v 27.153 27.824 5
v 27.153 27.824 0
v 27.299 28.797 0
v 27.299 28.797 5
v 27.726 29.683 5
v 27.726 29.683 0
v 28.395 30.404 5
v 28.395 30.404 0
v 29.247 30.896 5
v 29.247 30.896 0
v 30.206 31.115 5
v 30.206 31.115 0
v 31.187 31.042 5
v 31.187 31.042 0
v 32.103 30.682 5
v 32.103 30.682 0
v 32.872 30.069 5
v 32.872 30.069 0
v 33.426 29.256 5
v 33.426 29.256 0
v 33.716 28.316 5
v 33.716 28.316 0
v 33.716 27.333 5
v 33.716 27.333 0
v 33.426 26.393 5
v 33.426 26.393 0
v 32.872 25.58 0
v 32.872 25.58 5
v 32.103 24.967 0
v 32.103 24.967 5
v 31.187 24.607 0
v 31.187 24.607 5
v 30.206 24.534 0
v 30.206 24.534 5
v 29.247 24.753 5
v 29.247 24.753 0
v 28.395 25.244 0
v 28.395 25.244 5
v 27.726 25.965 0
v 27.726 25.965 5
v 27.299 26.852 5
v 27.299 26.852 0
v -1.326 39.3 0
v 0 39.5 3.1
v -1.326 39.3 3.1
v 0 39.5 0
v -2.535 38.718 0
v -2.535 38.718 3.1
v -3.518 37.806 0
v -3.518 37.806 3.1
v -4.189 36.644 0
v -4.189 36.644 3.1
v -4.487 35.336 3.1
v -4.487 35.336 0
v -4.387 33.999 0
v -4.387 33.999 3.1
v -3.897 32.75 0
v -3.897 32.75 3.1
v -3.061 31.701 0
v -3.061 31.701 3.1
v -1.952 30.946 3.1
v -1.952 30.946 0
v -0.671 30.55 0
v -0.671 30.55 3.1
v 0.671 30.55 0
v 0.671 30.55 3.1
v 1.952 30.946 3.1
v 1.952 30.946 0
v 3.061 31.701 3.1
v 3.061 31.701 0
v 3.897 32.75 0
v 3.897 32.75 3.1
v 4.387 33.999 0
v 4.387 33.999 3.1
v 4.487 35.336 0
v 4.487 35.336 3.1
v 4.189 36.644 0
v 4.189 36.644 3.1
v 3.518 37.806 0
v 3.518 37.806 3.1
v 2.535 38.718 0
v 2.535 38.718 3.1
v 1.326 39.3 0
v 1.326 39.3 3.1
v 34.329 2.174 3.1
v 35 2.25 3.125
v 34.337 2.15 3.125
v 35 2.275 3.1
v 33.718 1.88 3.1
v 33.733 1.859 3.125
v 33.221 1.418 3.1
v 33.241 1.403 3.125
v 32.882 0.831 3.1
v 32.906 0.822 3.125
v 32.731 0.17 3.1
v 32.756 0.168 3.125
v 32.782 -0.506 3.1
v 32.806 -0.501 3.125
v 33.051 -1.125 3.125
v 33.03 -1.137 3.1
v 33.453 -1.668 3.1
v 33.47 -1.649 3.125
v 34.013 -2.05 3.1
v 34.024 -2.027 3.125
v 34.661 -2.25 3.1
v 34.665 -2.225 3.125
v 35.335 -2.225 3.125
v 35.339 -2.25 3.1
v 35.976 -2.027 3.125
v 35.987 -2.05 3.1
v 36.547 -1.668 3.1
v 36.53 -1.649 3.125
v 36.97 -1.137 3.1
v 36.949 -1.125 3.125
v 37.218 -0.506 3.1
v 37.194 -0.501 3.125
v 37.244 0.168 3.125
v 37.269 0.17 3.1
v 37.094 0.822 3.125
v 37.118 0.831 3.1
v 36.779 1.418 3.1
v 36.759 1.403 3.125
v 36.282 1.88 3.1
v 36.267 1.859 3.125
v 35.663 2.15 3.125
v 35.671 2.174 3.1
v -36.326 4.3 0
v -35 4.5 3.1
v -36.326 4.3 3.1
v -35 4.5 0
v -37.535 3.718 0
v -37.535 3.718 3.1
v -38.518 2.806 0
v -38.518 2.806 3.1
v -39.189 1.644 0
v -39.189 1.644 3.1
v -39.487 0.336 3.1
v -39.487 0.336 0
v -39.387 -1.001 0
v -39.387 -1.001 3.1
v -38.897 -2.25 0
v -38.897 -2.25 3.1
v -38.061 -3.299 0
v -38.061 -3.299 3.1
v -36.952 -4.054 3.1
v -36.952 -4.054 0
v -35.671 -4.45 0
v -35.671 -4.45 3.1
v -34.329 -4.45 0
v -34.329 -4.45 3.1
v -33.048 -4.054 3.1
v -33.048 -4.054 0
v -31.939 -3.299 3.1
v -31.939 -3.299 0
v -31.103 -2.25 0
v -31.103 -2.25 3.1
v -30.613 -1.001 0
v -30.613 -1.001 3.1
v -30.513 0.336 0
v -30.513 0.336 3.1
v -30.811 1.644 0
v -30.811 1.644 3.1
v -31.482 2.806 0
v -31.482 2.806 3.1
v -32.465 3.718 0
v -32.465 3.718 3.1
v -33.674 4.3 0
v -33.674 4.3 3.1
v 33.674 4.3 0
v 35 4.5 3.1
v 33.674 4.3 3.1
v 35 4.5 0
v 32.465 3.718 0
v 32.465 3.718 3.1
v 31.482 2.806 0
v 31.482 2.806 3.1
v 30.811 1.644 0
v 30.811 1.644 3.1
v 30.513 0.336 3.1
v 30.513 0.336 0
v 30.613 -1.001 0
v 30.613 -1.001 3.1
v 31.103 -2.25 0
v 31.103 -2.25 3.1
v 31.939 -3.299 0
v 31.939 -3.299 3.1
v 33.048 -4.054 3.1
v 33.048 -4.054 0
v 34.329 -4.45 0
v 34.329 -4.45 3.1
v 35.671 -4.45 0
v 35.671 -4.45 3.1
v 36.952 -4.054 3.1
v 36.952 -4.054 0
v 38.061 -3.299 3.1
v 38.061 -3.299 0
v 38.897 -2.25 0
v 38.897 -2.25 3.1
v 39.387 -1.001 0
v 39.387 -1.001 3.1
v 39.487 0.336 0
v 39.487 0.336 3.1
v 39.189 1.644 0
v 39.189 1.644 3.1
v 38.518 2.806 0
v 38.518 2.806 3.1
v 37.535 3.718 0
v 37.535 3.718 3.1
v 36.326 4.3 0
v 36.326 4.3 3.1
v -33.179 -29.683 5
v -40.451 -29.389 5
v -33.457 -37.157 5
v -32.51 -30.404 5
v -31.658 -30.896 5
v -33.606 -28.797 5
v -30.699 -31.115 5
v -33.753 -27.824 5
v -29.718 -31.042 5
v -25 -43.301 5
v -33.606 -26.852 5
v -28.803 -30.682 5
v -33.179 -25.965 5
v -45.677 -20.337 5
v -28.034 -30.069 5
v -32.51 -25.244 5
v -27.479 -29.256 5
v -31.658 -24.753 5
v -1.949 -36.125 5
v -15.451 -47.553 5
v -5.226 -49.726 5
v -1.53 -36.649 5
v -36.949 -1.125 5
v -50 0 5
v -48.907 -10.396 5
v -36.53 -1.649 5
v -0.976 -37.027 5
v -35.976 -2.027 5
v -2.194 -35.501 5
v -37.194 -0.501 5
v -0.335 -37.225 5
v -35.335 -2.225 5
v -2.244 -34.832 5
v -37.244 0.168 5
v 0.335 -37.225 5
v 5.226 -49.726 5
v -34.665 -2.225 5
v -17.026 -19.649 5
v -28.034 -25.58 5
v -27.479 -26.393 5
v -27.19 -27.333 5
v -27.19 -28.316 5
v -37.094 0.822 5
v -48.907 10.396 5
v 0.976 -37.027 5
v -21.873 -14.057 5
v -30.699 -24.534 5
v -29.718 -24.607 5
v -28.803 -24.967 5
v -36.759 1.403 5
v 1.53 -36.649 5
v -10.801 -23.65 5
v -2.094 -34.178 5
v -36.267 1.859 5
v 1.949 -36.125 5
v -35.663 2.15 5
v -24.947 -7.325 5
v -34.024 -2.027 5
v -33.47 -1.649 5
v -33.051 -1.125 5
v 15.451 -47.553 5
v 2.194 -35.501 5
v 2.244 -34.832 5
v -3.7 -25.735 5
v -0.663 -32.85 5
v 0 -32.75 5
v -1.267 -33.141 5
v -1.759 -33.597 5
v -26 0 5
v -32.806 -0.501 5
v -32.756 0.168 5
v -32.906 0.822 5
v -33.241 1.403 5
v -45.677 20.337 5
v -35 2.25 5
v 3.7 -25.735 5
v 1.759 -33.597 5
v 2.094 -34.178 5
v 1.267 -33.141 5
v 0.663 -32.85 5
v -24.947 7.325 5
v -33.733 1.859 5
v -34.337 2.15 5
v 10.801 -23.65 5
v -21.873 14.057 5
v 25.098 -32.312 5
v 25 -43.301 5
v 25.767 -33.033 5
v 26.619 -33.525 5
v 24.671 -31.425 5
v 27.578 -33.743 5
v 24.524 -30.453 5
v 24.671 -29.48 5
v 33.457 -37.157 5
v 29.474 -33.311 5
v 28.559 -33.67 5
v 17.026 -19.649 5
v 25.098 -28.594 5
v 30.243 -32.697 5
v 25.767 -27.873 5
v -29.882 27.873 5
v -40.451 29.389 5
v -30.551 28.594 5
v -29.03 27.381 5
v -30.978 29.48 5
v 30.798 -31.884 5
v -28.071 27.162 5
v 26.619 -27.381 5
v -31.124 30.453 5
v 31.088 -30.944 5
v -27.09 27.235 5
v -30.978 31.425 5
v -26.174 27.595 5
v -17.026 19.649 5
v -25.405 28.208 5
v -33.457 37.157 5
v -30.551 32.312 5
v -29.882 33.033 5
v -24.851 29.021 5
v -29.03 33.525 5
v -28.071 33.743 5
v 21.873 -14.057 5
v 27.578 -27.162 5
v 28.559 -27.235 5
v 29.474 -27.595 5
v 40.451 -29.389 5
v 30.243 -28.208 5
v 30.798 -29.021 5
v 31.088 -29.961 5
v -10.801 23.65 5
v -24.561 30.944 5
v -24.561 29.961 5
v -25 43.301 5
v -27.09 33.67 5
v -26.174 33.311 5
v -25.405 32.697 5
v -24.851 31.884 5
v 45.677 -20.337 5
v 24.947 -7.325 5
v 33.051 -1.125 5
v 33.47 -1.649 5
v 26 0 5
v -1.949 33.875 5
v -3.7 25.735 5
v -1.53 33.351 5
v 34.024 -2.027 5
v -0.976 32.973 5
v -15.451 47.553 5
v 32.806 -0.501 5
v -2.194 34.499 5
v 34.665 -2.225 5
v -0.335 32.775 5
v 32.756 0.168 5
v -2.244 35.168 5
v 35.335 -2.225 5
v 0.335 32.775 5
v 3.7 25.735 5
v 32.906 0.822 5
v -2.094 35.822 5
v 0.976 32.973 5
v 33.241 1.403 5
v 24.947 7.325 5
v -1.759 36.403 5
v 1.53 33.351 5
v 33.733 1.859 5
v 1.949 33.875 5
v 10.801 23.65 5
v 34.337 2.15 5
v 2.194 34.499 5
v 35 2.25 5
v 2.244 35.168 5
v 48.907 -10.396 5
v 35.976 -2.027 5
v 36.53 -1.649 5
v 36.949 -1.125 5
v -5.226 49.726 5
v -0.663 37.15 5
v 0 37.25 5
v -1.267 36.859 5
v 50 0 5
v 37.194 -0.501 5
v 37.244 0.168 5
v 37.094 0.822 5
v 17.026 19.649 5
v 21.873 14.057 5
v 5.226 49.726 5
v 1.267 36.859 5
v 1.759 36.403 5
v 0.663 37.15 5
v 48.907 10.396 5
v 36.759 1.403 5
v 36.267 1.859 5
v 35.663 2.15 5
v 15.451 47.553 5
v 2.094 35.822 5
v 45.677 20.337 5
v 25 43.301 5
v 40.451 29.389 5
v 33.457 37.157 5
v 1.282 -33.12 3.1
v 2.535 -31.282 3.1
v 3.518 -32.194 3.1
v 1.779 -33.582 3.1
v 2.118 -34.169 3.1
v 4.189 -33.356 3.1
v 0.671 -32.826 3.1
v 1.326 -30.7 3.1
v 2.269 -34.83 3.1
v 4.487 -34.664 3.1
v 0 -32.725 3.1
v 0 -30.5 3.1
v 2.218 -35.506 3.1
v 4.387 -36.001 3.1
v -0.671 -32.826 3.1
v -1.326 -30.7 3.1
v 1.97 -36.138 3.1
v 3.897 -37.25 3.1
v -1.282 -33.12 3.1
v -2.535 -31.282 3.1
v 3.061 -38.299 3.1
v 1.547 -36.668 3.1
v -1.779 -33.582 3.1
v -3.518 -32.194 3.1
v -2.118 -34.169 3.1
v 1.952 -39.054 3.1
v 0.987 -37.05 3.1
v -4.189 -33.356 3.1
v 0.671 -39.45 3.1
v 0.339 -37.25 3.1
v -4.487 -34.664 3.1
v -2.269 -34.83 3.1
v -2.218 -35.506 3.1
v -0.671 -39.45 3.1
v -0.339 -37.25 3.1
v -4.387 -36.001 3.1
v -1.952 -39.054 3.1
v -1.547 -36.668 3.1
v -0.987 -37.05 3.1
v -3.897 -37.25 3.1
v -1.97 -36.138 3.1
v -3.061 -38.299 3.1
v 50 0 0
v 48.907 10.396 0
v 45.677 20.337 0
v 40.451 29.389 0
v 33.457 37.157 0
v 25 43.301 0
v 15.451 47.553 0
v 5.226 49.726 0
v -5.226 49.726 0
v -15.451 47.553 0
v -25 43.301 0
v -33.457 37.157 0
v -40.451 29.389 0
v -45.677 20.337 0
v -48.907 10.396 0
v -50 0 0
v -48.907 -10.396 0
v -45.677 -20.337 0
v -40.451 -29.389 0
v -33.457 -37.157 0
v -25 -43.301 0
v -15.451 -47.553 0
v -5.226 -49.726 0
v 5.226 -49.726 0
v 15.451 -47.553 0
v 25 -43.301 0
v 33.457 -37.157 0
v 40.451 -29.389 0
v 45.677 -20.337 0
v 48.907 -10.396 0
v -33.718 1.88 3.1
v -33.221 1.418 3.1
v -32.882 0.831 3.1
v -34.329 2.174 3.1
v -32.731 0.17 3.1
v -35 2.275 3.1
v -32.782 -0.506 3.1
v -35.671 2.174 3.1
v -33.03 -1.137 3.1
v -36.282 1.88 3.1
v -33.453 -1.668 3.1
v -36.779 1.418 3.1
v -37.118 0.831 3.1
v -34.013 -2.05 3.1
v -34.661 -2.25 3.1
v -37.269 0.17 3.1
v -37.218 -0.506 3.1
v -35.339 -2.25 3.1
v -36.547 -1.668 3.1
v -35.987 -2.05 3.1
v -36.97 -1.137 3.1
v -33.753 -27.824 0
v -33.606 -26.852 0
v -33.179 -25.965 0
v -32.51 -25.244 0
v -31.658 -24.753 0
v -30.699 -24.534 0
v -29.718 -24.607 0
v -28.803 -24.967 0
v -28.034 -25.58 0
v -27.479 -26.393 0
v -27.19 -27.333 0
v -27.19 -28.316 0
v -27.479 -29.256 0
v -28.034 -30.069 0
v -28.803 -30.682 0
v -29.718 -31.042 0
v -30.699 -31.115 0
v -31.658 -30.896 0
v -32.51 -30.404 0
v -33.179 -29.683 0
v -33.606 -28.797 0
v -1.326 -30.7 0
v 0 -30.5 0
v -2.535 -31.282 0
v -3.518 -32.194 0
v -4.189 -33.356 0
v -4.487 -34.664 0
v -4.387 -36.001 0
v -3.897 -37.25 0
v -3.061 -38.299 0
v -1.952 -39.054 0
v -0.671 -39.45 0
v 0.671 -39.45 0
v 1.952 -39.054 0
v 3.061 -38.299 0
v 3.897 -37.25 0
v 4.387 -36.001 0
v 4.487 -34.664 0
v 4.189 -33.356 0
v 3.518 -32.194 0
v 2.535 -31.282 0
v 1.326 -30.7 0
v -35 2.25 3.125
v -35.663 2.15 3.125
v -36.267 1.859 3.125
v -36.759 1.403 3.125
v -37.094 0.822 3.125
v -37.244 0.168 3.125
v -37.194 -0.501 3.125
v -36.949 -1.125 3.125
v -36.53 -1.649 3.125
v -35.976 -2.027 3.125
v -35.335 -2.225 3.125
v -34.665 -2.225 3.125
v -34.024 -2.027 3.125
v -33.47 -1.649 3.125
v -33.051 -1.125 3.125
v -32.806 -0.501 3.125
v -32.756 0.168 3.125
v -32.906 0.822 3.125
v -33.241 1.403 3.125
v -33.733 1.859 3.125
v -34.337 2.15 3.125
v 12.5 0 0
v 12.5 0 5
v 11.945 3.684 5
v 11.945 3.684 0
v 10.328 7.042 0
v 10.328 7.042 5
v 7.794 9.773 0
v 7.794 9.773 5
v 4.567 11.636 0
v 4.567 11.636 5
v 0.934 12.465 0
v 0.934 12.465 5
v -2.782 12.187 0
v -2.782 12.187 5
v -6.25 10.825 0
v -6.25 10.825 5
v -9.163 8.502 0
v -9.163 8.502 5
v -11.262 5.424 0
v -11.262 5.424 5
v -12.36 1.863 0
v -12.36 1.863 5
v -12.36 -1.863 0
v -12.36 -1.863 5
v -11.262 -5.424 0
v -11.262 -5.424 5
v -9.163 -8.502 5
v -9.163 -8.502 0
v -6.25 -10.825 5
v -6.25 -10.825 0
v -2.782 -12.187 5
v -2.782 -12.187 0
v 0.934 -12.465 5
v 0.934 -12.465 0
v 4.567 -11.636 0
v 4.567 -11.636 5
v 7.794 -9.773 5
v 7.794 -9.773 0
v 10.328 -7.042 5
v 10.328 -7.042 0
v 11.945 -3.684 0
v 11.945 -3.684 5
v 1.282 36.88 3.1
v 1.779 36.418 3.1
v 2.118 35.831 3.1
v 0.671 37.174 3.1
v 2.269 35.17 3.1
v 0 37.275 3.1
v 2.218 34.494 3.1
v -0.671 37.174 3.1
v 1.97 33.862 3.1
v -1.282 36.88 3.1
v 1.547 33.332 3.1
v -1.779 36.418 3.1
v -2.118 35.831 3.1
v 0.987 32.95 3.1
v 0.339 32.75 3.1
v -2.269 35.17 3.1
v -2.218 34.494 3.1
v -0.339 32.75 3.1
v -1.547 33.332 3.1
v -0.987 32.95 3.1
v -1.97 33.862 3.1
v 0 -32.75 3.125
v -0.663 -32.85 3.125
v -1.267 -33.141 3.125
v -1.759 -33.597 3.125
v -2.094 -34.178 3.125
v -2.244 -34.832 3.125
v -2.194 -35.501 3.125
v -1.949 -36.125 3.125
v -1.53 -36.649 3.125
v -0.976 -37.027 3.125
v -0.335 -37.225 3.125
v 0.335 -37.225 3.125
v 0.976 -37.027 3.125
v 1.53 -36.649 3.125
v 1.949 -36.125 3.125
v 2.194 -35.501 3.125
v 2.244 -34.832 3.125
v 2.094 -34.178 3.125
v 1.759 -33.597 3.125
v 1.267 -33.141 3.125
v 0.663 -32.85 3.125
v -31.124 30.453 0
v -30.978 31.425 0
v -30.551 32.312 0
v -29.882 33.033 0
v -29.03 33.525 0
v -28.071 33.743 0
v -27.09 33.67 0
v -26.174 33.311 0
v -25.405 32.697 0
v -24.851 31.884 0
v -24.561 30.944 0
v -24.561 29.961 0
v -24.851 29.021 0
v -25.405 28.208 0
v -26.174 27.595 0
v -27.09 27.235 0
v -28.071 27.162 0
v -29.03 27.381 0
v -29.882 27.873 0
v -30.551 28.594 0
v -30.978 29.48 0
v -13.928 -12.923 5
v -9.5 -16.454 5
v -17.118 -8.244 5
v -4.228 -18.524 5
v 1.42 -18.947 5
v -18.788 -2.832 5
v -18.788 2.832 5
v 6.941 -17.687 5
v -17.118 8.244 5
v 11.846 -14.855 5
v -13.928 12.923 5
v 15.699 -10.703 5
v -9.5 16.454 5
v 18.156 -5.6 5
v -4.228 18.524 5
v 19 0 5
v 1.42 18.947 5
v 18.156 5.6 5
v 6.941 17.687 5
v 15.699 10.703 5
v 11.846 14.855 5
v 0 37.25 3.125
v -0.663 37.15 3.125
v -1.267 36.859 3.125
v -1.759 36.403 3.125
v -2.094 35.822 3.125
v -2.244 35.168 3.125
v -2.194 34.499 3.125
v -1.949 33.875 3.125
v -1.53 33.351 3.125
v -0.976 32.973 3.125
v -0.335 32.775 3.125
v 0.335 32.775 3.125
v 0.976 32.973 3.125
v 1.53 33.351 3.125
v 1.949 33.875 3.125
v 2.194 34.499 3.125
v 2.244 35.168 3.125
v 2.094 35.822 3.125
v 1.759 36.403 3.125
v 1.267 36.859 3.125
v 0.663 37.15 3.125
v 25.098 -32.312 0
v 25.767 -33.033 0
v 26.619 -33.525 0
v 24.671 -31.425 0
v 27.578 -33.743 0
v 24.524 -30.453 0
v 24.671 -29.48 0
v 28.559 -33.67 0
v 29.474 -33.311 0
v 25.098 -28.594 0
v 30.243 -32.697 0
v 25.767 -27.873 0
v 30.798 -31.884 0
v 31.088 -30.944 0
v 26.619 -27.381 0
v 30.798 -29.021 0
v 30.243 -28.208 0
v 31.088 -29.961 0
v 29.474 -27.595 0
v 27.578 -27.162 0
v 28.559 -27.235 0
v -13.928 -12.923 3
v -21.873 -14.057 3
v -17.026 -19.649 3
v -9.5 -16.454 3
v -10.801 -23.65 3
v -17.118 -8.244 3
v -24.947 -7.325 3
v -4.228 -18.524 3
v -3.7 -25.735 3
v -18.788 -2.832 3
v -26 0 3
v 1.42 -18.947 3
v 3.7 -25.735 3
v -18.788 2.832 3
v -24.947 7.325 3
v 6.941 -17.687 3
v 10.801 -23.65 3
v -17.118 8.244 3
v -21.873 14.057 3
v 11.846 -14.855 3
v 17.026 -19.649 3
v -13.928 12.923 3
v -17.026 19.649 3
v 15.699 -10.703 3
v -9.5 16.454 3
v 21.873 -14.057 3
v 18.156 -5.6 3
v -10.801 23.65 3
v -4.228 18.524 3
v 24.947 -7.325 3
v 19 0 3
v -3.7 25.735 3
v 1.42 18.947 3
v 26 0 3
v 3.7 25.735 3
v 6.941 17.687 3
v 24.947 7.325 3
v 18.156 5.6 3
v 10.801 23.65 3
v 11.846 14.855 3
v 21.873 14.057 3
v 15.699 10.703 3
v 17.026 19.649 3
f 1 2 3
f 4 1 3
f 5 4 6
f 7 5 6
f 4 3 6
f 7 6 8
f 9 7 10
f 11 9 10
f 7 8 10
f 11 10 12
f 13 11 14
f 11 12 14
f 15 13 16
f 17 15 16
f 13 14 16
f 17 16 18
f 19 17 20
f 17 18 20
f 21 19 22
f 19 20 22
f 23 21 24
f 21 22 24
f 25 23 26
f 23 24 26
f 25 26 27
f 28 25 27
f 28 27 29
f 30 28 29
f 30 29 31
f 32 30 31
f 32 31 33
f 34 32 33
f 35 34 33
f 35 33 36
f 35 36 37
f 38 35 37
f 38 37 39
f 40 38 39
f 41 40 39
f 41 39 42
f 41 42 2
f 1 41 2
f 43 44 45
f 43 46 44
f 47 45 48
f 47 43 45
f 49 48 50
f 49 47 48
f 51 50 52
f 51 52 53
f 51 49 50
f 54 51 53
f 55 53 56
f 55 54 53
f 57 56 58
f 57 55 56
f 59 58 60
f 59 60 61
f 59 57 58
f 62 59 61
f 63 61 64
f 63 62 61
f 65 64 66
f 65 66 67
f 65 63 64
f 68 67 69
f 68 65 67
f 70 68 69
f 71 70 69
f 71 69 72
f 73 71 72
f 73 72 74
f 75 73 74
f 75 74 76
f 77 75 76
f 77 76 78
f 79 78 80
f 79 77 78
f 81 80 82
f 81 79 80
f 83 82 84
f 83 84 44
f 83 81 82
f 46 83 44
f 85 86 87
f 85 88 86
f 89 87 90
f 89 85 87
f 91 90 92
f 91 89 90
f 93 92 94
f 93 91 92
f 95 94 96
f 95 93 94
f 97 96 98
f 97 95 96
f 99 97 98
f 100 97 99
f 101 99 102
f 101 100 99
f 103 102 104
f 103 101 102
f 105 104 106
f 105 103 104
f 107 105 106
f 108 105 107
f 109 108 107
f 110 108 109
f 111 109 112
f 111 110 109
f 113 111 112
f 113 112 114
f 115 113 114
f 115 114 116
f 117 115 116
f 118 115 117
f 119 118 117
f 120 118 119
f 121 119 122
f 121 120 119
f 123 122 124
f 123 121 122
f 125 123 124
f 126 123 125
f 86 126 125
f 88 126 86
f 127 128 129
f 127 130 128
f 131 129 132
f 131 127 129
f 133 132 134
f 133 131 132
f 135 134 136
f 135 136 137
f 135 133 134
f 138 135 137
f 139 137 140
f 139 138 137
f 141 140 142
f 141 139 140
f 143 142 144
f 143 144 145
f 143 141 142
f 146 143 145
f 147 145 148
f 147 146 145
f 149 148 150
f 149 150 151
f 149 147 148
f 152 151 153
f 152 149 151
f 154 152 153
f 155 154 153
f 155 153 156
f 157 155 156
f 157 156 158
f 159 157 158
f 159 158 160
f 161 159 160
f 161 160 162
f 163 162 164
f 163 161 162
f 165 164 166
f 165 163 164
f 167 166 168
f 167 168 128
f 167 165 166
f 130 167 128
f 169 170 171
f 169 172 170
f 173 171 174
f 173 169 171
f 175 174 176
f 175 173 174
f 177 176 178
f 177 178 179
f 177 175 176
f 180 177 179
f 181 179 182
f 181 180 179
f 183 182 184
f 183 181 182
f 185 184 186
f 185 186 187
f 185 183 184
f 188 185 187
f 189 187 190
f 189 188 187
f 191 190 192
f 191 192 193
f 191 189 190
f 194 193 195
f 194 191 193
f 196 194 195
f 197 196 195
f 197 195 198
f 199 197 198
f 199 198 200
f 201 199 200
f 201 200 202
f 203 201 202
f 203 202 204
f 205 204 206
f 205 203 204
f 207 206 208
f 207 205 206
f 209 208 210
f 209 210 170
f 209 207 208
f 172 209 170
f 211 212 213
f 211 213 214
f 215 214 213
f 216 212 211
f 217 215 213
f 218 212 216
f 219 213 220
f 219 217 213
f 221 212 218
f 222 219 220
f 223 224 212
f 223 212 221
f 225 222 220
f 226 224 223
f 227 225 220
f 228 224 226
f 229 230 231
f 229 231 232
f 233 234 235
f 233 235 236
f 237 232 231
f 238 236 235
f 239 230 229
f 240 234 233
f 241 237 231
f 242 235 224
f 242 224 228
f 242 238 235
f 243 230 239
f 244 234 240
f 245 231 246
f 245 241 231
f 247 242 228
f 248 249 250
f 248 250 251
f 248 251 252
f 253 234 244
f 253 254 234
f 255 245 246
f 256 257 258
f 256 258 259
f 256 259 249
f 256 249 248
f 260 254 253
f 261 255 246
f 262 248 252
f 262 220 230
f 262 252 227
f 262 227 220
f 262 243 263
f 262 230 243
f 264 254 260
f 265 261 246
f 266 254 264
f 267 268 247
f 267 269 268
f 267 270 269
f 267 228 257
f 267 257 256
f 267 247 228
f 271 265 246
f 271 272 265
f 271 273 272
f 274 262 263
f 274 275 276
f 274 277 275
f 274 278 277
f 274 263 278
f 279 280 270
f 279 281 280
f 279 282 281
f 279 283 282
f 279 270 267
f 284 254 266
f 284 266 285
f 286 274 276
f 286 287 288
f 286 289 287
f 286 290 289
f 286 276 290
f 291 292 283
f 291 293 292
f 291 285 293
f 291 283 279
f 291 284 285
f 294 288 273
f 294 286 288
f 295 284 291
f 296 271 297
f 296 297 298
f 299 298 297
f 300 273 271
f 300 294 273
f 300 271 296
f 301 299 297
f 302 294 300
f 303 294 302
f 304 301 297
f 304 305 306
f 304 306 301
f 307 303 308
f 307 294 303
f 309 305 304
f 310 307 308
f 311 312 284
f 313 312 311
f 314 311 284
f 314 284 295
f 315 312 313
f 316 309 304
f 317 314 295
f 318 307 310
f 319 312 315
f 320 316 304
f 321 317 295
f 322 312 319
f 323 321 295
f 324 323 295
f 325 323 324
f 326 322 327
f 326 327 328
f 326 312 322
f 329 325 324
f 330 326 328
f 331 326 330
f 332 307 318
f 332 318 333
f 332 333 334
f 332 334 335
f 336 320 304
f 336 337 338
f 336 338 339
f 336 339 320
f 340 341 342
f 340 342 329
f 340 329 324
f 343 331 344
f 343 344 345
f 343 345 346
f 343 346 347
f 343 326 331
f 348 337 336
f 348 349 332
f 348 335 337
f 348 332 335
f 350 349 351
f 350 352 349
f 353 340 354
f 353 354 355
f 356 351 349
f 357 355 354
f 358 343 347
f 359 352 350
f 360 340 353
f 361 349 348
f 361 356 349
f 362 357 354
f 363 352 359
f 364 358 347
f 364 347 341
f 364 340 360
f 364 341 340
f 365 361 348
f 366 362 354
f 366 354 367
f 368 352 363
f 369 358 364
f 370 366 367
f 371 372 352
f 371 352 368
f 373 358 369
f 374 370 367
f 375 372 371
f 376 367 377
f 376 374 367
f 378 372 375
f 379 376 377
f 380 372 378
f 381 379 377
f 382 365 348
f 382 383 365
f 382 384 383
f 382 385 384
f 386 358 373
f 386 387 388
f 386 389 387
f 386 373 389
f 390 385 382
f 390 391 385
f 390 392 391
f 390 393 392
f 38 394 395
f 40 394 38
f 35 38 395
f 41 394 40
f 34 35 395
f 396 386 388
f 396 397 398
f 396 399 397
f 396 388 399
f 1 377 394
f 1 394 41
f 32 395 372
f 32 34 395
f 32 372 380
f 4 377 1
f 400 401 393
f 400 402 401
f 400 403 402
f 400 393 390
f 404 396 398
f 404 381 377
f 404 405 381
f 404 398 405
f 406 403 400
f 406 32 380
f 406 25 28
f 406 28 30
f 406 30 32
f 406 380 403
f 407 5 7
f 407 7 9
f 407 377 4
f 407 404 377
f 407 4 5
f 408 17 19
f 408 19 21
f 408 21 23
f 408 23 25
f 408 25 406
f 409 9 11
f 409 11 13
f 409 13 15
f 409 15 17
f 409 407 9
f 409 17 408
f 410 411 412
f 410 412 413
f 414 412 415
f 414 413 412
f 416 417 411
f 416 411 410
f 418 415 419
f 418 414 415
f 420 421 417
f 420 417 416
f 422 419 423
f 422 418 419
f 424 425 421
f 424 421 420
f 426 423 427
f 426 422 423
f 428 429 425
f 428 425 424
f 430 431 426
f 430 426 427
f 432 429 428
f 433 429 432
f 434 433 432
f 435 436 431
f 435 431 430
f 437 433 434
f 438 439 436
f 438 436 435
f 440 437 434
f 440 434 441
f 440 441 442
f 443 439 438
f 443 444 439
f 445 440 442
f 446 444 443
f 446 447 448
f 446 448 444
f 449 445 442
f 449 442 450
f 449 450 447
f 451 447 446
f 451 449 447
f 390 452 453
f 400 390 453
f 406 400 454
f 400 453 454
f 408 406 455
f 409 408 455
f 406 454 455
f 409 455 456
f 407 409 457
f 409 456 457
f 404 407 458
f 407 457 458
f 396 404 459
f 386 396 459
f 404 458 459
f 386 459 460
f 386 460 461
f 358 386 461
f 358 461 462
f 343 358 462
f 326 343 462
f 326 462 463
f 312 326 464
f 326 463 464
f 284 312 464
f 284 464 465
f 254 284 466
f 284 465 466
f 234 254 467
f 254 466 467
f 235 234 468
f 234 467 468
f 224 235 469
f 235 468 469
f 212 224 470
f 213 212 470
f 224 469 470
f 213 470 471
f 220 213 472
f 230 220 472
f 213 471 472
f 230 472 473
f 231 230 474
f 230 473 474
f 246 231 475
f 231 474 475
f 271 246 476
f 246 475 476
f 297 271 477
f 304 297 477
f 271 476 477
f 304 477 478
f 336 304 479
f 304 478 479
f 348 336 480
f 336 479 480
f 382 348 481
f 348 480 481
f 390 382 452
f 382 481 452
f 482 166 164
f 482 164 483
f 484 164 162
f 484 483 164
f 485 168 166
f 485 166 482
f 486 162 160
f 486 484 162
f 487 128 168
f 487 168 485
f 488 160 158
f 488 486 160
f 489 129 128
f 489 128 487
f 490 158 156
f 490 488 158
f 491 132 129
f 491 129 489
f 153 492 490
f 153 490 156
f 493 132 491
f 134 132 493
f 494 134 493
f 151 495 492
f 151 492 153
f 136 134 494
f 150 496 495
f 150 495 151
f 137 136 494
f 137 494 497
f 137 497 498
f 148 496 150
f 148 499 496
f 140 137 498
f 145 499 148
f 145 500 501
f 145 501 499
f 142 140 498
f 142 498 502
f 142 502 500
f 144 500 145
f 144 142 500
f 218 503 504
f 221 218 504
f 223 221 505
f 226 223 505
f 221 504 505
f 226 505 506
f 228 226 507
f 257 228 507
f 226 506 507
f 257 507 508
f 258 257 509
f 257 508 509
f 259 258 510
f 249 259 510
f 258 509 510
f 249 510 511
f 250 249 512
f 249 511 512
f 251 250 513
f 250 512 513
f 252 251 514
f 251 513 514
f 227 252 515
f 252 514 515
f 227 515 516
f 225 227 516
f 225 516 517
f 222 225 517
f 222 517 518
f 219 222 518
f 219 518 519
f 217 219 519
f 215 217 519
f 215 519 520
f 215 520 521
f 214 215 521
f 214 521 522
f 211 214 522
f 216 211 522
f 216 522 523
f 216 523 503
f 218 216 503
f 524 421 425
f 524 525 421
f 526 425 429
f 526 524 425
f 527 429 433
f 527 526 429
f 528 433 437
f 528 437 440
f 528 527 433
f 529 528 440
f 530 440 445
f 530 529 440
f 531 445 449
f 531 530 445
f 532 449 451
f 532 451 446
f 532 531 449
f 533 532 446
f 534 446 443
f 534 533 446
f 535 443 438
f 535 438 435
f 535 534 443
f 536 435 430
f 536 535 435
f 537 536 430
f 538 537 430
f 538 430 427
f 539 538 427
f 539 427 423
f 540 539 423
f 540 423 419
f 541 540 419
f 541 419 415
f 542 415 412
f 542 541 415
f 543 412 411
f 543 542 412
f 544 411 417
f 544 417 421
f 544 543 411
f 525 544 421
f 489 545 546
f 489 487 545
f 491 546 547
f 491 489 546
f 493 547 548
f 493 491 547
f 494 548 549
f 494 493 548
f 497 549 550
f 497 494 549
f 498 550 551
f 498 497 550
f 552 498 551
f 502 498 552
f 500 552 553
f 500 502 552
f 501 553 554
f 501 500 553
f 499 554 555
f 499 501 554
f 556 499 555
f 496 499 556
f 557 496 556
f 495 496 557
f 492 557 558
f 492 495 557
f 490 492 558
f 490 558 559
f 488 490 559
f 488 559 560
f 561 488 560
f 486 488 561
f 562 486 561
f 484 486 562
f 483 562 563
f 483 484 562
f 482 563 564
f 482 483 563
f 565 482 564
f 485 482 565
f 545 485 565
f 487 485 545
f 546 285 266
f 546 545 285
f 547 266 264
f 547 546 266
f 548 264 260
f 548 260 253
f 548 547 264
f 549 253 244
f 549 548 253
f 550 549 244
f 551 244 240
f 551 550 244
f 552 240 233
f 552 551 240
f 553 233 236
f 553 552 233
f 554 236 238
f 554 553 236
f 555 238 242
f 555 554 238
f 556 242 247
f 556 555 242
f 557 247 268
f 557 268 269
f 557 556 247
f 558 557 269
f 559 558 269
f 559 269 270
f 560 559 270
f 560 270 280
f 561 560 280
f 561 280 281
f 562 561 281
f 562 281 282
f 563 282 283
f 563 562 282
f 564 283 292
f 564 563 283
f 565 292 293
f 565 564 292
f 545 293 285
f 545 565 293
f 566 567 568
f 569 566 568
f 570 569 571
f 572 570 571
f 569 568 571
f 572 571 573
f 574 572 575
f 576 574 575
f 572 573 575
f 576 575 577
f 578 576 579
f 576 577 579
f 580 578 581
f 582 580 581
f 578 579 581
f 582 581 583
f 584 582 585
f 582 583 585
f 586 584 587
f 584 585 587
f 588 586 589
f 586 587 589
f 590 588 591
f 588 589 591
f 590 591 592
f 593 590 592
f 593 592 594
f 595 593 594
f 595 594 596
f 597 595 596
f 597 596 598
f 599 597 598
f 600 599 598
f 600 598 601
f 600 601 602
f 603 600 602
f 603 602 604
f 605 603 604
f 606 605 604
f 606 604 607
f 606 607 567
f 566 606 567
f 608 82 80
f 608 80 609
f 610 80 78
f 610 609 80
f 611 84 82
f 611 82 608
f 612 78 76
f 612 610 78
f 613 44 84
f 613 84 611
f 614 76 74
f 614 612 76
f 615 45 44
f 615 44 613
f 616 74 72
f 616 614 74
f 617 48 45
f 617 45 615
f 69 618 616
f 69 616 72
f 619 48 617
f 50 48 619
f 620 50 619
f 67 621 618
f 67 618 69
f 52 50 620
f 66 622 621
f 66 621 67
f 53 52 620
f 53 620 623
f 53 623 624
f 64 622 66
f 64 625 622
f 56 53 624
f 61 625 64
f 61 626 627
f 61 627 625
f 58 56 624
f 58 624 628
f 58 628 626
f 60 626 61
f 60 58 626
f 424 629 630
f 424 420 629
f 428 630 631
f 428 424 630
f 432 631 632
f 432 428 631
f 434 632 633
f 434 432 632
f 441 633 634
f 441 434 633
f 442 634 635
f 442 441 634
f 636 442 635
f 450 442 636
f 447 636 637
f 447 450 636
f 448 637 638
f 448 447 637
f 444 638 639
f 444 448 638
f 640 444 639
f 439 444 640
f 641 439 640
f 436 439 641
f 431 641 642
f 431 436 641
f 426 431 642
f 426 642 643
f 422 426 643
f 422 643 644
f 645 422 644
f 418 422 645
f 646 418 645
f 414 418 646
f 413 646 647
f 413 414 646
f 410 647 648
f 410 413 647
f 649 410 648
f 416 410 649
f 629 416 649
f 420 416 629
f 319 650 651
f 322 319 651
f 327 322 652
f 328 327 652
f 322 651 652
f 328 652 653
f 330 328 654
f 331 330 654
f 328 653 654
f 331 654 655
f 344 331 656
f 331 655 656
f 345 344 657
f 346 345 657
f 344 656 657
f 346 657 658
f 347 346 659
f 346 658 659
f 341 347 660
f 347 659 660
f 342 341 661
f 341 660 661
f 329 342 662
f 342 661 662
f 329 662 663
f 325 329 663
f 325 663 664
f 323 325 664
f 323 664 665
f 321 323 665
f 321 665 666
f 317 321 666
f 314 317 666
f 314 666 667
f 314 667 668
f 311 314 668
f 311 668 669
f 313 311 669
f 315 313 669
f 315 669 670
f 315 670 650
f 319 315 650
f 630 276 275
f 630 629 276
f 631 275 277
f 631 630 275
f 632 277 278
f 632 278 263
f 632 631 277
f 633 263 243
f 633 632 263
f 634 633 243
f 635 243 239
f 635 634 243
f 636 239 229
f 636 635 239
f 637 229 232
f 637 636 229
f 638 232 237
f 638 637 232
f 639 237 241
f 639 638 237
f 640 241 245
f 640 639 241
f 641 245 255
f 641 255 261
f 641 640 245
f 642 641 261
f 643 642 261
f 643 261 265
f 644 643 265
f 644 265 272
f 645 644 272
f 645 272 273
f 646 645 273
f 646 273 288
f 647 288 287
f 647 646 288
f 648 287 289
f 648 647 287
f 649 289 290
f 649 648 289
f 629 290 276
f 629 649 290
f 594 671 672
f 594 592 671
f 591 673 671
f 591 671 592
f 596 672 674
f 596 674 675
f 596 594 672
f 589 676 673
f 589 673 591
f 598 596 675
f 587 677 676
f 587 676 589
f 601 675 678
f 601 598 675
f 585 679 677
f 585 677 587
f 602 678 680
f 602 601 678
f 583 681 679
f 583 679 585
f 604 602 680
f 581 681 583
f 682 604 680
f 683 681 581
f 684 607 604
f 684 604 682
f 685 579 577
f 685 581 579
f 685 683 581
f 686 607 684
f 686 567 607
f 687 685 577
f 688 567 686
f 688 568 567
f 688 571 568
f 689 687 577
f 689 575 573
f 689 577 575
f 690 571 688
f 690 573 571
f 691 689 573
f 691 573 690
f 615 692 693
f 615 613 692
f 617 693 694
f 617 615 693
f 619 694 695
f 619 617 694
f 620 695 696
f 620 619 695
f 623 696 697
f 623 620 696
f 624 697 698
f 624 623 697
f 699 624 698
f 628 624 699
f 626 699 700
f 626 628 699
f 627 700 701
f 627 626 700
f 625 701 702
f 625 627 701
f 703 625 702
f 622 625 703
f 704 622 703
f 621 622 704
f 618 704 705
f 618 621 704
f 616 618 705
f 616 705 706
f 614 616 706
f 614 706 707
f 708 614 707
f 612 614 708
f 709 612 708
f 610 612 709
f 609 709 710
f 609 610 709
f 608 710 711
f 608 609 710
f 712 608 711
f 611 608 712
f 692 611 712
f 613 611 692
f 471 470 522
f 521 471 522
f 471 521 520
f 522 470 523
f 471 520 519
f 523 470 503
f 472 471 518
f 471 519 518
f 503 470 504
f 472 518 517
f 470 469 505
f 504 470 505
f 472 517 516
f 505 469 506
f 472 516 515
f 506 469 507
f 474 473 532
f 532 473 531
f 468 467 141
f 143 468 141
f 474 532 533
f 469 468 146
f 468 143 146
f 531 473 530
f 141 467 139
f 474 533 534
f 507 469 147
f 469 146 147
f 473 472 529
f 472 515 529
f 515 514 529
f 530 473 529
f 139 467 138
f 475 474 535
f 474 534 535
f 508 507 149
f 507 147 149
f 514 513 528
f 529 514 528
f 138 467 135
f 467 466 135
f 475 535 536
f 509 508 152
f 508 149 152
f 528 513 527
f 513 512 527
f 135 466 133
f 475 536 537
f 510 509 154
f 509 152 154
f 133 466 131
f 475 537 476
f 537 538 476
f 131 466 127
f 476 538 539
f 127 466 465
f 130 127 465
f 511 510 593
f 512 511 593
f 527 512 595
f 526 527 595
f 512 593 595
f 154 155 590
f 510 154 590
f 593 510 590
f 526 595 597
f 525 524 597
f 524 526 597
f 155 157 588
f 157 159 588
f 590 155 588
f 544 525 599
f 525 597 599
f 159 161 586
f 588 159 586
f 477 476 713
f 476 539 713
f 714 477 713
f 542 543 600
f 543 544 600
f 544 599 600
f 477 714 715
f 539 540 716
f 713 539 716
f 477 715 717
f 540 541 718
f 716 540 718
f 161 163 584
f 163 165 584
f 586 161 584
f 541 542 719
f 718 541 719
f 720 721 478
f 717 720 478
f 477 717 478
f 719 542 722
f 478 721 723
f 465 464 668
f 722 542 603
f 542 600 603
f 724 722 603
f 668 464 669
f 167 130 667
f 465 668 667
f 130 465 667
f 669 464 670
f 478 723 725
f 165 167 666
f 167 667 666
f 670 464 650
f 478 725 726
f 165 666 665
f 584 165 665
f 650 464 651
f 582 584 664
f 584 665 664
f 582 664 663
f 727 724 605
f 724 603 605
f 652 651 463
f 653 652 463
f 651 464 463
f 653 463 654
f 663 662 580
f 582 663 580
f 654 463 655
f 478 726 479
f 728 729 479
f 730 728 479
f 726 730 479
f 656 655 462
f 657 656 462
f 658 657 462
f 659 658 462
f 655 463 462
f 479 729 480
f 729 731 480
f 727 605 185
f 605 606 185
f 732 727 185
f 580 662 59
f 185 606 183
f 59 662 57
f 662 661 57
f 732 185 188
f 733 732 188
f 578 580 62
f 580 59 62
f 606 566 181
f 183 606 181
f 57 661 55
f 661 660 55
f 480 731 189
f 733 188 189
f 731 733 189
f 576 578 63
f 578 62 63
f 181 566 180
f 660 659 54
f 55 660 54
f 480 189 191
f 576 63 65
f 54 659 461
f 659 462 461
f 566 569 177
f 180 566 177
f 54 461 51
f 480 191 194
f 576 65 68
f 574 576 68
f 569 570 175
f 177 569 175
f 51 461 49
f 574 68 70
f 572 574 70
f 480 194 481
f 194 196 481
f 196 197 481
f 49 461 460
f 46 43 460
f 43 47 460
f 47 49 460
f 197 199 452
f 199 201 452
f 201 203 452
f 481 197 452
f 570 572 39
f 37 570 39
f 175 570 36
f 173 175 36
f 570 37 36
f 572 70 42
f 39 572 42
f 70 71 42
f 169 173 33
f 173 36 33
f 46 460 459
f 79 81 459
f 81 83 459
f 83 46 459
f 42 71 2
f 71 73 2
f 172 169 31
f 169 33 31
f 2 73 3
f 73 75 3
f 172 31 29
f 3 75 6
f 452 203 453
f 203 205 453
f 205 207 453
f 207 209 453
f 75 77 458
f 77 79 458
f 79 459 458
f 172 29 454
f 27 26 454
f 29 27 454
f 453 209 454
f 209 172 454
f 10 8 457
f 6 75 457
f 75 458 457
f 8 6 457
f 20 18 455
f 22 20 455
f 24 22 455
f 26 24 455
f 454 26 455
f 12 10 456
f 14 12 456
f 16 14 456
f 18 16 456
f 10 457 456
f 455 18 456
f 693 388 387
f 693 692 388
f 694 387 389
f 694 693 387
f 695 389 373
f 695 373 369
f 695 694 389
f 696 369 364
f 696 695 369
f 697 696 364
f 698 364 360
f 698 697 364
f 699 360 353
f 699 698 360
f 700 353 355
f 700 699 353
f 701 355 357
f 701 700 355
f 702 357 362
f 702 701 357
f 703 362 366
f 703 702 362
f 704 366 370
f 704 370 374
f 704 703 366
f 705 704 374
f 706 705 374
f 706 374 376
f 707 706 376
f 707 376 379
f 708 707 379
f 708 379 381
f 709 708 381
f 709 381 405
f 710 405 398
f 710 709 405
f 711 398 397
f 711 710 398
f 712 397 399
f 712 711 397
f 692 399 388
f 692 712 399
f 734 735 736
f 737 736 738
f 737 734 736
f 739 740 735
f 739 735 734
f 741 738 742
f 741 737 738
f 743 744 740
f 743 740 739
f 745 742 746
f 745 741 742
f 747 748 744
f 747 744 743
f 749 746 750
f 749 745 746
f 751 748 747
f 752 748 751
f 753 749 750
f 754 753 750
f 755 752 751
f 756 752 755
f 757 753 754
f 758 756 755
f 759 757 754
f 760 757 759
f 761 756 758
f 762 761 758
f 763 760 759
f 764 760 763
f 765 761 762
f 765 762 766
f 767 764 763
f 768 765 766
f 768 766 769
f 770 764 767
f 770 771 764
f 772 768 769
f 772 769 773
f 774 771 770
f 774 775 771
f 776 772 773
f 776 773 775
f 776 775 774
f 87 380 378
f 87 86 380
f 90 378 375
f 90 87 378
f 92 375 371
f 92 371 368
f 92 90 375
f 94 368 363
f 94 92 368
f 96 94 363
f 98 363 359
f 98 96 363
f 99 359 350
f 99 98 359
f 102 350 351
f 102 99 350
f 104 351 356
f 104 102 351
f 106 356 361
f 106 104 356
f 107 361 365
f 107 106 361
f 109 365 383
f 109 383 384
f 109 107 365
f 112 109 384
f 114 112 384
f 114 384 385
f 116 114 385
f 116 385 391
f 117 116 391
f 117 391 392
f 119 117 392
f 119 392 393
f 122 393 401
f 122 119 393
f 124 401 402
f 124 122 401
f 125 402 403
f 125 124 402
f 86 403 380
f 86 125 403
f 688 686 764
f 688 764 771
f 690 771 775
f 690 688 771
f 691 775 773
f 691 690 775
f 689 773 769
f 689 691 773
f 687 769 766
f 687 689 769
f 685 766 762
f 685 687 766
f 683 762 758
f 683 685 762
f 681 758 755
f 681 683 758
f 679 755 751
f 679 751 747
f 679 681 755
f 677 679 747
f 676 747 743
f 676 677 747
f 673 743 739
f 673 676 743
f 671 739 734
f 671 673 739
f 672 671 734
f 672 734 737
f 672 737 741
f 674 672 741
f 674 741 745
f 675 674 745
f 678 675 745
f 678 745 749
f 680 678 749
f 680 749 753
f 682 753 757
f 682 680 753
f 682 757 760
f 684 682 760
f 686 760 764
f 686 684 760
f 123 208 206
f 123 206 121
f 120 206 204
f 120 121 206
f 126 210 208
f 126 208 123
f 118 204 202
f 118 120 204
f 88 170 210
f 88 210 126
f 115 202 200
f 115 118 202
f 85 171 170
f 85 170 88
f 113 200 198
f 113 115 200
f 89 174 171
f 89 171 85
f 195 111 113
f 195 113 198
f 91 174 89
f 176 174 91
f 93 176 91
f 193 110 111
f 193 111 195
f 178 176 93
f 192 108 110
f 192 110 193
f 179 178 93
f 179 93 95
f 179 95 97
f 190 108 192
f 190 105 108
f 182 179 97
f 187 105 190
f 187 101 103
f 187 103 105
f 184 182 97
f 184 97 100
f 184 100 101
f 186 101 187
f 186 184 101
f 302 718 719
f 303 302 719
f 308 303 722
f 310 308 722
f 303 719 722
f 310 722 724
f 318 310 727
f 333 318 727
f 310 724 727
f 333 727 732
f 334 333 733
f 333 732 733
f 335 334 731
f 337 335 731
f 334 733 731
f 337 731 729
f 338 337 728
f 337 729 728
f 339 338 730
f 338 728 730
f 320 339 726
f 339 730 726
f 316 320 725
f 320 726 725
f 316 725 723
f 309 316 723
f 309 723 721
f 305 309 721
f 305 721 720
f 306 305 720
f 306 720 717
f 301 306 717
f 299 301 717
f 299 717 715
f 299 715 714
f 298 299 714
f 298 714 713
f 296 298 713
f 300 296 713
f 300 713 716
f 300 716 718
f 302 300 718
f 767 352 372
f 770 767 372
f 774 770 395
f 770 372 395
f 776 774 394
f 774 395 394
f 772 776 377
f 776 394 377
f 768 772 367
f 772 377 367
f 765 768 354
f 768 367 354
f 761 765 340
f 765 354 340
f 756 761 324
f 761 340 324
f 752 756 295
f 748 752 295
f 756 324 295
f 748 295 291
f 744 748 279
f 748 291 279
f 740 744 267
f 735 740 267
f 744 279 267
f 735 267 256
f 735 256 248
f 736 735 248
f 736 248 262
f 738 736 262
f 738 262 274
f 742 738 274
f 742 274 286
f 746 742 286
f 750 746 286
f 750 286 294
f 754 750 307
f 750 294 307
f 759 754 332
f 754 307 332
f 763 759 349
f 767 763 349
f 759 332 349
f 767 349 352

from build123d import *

# Parameters (mm, degrees)
ESQUISSE1_R                                = 50
BOSS_EXTRU_1_DEPTH                         = 5
ESQUISSE2_R                                = 26
ESQUISSE2_R_2                              = 19
ENL_V_MAT_EXTRU_1_DEPTH                    = 2
ESQUISSE3_R                                = 12.5
ENL_V_MAT_EXTRU_2_DEPTH                    = 71.887234394
CHAMBRAGE_POUR_VIS_T_TE_RONDE_BOMB_2_COUNT = 2
CHAMBRAGE_POUR_VIS_T_TE_RONDE_BOMB_2_PITCH = 49.497474683
CHAMBRAGE_POUR_VIS_T_TE_RONDE_BOMB_3_COUNT = 2
CHAMBRAGE_POUR_VIS_T_TE_RONDE_BOMB_3_PITCH = 70
CHAMBRAGE_POUR_VIS_T_TE_RONDE_BOMB_4_COUNT = 2
CHAMBRAGE_POUR_VIS_T_TE_RONDE_BOMB_4_PITCH = 49.497474683
D_GAGEMENT_M62_D                           = 6.6


with BuildPart() as part:
    # Esquisse1 → Boss.-Extru.1 (new body)
    with BuildSketch(Plane.XY):
        Circle(ESQUISSE1_R)
    extrude(amount=BOSS_EXTRU_1_DEPTH)

    # Esquisse2 → Enlèv. mat.-Extru.1 (cut)
    with BuildSketch(Plane.XY.offset(5)):
        Circle(ESQUISSE2_R)
        Circle(ESQUISSE2_R_2, mode=Mode.SUBTRACT)
    extrude(amount=-ENL_V_MAT_EXTRU_1_DEPTH, mode=Mode.SUBTRACT)

    # Esquisse3 → Enlèv. mat.-Extru.2 (cut, through all)
    with BuildSketch(Plane.XY.offset(5)):
        Circle(ESQUISSE3_R)
    extrude(amount=-ENL_V_MAT_EXTRU_2_DEPTH, mode=Mode.SUBTRACT)

    # Esquisse5 → Chambrage pour vis à tête ronde bombée M41 (revolve, cut)
    with BuildSketch(Plane(origin=(0, 35, 0), x_dir=(0, 1, 0), z_dir=(1, 0, 0))):
        Polygon((0, 0), (0, 5), (2.25, 5), (2.25, 3.125), (2.275, 3.1), (4.5, 3.1), (4.5, 0), align=None)
    chambrage_pour_vis_t_te_ronde_bomb_e_m = revolve(axis=Axis((0, 35, -6.35), (0, 0, 1)), mode=Mode.SUBTRACT)

    # Chambrage pour vis _ t_te ronde bomb 2: Chambrage pour vis à tête ronde bombée M41 ×2
    with Locations(*[Vector(-0.7071067811865476, -0.7071067811865476, 0) * (i * CHAMBRAGE_POUR_VIS_T_TE_RONDE_BOMB_2_PITCH) for i in range(1, CHAMBRAGE_POUR_VIS_T_TE_RONDE_BOMB_2_COUNT)]):
        add(chambrage_pour_vis_t_te_ronde_bomb_e_m, mode=Mode.SUBTRACT)

    # Chambrage pour vis _ t_te ronde bomb 3: Chambrage pour vis à tête ronde bombée M41 ×2
    with Locations(*[(0, -i * CHAMBRAGE_POUR_VIS_T_TE_RONDE_BOMB_3_PITCH, 0) for i in range(1, CHAMBRAGE_POUR_VIS_T_TE_RONDE_BOMB_3_COUNT)]):
        add(chambrage_pour_vis_t_te_ronde_bomb_e_m, mode=Mode.SUBTRACT)

    # Chambrage pour vis _ t_te ronde bomb 4: Chambrage pour vis à tête ronde bombée M41 ×2
    with Locations(*[Vector(0.7071067811865476, -0.7071067811865476, 0) * (i * CHAMBRAGE_POUR_VIS_T_TE_RONDE_BOMB_4_PITCH) for i in range(1, CHAMBRAGE_POUR_VIS_T_TE_RONDE_BOMB_4_COUNT)]):
        add(chambrage_pour_vis_t_te_ronde_bomb_e_m, mode=Mode.SUBTRACT)

    # Dégagement M62 (through all)
    with Locations(Plane.XY.offset(5)):
        with Locations((30.452660491, 27.824413184), (-27.824413184, 30.452660491), (-30.452660491, -27.824413184), (27.824413184, -30.452660491)):
            Hole(D_GAGEMENT_M62_D / 2)


solid = part.part
